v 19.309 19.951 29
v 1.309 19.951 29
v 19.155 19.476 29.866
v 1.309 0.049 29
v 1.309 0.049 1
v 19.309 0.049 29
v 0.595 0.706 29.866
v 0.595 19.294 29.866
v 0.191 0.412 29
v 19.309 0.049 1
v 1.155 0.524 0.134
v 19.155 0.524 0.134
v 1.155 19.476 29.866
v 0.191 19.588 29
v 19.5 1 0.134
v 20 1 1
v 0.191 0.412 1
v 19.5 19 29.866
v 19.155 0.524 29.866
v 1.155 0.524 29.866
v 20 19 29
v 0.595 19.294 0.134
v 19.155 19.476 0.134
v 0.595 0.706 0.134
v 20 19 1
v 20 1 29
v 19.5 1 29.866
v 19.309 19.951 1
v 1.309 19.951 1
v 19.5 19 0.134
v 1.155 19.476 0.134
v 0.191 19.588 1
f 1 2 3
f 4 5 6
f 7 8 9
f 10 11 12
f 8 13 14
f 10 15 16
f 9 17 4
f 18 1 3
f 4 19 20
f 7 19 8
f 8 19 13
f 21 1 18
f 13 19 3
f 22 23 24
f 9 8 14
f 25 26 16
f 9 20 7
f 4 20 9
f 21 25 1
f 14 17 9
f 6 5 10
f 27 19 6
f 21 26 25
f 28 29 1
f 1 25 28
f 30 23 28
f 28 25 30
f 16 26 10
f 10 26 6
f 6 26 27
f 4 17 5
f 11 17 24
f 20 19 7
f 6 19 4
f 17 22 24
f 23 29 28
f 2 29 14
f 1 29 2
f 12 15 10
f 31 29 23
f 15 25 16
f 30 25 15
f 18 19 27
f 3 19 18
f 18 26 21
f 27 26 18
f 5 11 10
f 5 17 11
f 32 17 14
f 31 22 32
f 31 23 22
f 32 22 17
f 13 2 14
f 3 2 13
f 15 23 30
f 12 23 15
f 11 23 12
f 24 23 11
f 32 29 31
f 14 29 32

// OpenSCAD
// file: modules.scad
unit = 10;

module roundCube(dimensions, margin=1) {
  cubeDimensions = [for(d = dimensions) d - 2*margin];
  translate([margin, margin, margin])
  minkowski() {
    cube(cubeDimensions);
    sphere(r=margin, center=true);
  }
}

module thrice(translations, dimensions, unit) {
  ts = [for(t=translations) t * unit];
  ds = [for(d=dimensions) d * unit];

  translate(ts)
  roundCube(ds);

  translate([ts[2], ts[0], ts[1]])
  roundCube([ds[2], ds[0], ds[1]]);

  translate([ts[1], ts[2], ts[0]])
  roundCube([ds[1], ds[2], ds[0]]);
}

module puzzle(unit) {
  for(i=[0:4]) {
    translate([i*unit, i*unit, i*unit])
    roundCube([unit, unit, unit]);
  }

  color([0, 0, 1]) {
    thrice([1,0,0], [4,2,1], unit);
    thrice([3,4,0], [2,1,4], unit);
  }

  color([1, 0, 0]) {
    thrice([2,0,1], [3,2,2], unit);
    thrice([3,2,0], [2,2,3], unit);
  }
}

module puzzleBox(unit, margin=1) {
  u = 5 * unit;
  2m = 2 * margin;

  color([0, 1, 0]) {
    difference() {
      translate([-margin, -margin, -margin])
      roundCube([u+2m, u+2m, u+2m]);

      translate([0, 0, 2m])
      roundCube([u, u, u]);
    }
  }
}
// main file
include <modules.scad>

roundCube([2*unit, 2*unit, 3*unit]);
